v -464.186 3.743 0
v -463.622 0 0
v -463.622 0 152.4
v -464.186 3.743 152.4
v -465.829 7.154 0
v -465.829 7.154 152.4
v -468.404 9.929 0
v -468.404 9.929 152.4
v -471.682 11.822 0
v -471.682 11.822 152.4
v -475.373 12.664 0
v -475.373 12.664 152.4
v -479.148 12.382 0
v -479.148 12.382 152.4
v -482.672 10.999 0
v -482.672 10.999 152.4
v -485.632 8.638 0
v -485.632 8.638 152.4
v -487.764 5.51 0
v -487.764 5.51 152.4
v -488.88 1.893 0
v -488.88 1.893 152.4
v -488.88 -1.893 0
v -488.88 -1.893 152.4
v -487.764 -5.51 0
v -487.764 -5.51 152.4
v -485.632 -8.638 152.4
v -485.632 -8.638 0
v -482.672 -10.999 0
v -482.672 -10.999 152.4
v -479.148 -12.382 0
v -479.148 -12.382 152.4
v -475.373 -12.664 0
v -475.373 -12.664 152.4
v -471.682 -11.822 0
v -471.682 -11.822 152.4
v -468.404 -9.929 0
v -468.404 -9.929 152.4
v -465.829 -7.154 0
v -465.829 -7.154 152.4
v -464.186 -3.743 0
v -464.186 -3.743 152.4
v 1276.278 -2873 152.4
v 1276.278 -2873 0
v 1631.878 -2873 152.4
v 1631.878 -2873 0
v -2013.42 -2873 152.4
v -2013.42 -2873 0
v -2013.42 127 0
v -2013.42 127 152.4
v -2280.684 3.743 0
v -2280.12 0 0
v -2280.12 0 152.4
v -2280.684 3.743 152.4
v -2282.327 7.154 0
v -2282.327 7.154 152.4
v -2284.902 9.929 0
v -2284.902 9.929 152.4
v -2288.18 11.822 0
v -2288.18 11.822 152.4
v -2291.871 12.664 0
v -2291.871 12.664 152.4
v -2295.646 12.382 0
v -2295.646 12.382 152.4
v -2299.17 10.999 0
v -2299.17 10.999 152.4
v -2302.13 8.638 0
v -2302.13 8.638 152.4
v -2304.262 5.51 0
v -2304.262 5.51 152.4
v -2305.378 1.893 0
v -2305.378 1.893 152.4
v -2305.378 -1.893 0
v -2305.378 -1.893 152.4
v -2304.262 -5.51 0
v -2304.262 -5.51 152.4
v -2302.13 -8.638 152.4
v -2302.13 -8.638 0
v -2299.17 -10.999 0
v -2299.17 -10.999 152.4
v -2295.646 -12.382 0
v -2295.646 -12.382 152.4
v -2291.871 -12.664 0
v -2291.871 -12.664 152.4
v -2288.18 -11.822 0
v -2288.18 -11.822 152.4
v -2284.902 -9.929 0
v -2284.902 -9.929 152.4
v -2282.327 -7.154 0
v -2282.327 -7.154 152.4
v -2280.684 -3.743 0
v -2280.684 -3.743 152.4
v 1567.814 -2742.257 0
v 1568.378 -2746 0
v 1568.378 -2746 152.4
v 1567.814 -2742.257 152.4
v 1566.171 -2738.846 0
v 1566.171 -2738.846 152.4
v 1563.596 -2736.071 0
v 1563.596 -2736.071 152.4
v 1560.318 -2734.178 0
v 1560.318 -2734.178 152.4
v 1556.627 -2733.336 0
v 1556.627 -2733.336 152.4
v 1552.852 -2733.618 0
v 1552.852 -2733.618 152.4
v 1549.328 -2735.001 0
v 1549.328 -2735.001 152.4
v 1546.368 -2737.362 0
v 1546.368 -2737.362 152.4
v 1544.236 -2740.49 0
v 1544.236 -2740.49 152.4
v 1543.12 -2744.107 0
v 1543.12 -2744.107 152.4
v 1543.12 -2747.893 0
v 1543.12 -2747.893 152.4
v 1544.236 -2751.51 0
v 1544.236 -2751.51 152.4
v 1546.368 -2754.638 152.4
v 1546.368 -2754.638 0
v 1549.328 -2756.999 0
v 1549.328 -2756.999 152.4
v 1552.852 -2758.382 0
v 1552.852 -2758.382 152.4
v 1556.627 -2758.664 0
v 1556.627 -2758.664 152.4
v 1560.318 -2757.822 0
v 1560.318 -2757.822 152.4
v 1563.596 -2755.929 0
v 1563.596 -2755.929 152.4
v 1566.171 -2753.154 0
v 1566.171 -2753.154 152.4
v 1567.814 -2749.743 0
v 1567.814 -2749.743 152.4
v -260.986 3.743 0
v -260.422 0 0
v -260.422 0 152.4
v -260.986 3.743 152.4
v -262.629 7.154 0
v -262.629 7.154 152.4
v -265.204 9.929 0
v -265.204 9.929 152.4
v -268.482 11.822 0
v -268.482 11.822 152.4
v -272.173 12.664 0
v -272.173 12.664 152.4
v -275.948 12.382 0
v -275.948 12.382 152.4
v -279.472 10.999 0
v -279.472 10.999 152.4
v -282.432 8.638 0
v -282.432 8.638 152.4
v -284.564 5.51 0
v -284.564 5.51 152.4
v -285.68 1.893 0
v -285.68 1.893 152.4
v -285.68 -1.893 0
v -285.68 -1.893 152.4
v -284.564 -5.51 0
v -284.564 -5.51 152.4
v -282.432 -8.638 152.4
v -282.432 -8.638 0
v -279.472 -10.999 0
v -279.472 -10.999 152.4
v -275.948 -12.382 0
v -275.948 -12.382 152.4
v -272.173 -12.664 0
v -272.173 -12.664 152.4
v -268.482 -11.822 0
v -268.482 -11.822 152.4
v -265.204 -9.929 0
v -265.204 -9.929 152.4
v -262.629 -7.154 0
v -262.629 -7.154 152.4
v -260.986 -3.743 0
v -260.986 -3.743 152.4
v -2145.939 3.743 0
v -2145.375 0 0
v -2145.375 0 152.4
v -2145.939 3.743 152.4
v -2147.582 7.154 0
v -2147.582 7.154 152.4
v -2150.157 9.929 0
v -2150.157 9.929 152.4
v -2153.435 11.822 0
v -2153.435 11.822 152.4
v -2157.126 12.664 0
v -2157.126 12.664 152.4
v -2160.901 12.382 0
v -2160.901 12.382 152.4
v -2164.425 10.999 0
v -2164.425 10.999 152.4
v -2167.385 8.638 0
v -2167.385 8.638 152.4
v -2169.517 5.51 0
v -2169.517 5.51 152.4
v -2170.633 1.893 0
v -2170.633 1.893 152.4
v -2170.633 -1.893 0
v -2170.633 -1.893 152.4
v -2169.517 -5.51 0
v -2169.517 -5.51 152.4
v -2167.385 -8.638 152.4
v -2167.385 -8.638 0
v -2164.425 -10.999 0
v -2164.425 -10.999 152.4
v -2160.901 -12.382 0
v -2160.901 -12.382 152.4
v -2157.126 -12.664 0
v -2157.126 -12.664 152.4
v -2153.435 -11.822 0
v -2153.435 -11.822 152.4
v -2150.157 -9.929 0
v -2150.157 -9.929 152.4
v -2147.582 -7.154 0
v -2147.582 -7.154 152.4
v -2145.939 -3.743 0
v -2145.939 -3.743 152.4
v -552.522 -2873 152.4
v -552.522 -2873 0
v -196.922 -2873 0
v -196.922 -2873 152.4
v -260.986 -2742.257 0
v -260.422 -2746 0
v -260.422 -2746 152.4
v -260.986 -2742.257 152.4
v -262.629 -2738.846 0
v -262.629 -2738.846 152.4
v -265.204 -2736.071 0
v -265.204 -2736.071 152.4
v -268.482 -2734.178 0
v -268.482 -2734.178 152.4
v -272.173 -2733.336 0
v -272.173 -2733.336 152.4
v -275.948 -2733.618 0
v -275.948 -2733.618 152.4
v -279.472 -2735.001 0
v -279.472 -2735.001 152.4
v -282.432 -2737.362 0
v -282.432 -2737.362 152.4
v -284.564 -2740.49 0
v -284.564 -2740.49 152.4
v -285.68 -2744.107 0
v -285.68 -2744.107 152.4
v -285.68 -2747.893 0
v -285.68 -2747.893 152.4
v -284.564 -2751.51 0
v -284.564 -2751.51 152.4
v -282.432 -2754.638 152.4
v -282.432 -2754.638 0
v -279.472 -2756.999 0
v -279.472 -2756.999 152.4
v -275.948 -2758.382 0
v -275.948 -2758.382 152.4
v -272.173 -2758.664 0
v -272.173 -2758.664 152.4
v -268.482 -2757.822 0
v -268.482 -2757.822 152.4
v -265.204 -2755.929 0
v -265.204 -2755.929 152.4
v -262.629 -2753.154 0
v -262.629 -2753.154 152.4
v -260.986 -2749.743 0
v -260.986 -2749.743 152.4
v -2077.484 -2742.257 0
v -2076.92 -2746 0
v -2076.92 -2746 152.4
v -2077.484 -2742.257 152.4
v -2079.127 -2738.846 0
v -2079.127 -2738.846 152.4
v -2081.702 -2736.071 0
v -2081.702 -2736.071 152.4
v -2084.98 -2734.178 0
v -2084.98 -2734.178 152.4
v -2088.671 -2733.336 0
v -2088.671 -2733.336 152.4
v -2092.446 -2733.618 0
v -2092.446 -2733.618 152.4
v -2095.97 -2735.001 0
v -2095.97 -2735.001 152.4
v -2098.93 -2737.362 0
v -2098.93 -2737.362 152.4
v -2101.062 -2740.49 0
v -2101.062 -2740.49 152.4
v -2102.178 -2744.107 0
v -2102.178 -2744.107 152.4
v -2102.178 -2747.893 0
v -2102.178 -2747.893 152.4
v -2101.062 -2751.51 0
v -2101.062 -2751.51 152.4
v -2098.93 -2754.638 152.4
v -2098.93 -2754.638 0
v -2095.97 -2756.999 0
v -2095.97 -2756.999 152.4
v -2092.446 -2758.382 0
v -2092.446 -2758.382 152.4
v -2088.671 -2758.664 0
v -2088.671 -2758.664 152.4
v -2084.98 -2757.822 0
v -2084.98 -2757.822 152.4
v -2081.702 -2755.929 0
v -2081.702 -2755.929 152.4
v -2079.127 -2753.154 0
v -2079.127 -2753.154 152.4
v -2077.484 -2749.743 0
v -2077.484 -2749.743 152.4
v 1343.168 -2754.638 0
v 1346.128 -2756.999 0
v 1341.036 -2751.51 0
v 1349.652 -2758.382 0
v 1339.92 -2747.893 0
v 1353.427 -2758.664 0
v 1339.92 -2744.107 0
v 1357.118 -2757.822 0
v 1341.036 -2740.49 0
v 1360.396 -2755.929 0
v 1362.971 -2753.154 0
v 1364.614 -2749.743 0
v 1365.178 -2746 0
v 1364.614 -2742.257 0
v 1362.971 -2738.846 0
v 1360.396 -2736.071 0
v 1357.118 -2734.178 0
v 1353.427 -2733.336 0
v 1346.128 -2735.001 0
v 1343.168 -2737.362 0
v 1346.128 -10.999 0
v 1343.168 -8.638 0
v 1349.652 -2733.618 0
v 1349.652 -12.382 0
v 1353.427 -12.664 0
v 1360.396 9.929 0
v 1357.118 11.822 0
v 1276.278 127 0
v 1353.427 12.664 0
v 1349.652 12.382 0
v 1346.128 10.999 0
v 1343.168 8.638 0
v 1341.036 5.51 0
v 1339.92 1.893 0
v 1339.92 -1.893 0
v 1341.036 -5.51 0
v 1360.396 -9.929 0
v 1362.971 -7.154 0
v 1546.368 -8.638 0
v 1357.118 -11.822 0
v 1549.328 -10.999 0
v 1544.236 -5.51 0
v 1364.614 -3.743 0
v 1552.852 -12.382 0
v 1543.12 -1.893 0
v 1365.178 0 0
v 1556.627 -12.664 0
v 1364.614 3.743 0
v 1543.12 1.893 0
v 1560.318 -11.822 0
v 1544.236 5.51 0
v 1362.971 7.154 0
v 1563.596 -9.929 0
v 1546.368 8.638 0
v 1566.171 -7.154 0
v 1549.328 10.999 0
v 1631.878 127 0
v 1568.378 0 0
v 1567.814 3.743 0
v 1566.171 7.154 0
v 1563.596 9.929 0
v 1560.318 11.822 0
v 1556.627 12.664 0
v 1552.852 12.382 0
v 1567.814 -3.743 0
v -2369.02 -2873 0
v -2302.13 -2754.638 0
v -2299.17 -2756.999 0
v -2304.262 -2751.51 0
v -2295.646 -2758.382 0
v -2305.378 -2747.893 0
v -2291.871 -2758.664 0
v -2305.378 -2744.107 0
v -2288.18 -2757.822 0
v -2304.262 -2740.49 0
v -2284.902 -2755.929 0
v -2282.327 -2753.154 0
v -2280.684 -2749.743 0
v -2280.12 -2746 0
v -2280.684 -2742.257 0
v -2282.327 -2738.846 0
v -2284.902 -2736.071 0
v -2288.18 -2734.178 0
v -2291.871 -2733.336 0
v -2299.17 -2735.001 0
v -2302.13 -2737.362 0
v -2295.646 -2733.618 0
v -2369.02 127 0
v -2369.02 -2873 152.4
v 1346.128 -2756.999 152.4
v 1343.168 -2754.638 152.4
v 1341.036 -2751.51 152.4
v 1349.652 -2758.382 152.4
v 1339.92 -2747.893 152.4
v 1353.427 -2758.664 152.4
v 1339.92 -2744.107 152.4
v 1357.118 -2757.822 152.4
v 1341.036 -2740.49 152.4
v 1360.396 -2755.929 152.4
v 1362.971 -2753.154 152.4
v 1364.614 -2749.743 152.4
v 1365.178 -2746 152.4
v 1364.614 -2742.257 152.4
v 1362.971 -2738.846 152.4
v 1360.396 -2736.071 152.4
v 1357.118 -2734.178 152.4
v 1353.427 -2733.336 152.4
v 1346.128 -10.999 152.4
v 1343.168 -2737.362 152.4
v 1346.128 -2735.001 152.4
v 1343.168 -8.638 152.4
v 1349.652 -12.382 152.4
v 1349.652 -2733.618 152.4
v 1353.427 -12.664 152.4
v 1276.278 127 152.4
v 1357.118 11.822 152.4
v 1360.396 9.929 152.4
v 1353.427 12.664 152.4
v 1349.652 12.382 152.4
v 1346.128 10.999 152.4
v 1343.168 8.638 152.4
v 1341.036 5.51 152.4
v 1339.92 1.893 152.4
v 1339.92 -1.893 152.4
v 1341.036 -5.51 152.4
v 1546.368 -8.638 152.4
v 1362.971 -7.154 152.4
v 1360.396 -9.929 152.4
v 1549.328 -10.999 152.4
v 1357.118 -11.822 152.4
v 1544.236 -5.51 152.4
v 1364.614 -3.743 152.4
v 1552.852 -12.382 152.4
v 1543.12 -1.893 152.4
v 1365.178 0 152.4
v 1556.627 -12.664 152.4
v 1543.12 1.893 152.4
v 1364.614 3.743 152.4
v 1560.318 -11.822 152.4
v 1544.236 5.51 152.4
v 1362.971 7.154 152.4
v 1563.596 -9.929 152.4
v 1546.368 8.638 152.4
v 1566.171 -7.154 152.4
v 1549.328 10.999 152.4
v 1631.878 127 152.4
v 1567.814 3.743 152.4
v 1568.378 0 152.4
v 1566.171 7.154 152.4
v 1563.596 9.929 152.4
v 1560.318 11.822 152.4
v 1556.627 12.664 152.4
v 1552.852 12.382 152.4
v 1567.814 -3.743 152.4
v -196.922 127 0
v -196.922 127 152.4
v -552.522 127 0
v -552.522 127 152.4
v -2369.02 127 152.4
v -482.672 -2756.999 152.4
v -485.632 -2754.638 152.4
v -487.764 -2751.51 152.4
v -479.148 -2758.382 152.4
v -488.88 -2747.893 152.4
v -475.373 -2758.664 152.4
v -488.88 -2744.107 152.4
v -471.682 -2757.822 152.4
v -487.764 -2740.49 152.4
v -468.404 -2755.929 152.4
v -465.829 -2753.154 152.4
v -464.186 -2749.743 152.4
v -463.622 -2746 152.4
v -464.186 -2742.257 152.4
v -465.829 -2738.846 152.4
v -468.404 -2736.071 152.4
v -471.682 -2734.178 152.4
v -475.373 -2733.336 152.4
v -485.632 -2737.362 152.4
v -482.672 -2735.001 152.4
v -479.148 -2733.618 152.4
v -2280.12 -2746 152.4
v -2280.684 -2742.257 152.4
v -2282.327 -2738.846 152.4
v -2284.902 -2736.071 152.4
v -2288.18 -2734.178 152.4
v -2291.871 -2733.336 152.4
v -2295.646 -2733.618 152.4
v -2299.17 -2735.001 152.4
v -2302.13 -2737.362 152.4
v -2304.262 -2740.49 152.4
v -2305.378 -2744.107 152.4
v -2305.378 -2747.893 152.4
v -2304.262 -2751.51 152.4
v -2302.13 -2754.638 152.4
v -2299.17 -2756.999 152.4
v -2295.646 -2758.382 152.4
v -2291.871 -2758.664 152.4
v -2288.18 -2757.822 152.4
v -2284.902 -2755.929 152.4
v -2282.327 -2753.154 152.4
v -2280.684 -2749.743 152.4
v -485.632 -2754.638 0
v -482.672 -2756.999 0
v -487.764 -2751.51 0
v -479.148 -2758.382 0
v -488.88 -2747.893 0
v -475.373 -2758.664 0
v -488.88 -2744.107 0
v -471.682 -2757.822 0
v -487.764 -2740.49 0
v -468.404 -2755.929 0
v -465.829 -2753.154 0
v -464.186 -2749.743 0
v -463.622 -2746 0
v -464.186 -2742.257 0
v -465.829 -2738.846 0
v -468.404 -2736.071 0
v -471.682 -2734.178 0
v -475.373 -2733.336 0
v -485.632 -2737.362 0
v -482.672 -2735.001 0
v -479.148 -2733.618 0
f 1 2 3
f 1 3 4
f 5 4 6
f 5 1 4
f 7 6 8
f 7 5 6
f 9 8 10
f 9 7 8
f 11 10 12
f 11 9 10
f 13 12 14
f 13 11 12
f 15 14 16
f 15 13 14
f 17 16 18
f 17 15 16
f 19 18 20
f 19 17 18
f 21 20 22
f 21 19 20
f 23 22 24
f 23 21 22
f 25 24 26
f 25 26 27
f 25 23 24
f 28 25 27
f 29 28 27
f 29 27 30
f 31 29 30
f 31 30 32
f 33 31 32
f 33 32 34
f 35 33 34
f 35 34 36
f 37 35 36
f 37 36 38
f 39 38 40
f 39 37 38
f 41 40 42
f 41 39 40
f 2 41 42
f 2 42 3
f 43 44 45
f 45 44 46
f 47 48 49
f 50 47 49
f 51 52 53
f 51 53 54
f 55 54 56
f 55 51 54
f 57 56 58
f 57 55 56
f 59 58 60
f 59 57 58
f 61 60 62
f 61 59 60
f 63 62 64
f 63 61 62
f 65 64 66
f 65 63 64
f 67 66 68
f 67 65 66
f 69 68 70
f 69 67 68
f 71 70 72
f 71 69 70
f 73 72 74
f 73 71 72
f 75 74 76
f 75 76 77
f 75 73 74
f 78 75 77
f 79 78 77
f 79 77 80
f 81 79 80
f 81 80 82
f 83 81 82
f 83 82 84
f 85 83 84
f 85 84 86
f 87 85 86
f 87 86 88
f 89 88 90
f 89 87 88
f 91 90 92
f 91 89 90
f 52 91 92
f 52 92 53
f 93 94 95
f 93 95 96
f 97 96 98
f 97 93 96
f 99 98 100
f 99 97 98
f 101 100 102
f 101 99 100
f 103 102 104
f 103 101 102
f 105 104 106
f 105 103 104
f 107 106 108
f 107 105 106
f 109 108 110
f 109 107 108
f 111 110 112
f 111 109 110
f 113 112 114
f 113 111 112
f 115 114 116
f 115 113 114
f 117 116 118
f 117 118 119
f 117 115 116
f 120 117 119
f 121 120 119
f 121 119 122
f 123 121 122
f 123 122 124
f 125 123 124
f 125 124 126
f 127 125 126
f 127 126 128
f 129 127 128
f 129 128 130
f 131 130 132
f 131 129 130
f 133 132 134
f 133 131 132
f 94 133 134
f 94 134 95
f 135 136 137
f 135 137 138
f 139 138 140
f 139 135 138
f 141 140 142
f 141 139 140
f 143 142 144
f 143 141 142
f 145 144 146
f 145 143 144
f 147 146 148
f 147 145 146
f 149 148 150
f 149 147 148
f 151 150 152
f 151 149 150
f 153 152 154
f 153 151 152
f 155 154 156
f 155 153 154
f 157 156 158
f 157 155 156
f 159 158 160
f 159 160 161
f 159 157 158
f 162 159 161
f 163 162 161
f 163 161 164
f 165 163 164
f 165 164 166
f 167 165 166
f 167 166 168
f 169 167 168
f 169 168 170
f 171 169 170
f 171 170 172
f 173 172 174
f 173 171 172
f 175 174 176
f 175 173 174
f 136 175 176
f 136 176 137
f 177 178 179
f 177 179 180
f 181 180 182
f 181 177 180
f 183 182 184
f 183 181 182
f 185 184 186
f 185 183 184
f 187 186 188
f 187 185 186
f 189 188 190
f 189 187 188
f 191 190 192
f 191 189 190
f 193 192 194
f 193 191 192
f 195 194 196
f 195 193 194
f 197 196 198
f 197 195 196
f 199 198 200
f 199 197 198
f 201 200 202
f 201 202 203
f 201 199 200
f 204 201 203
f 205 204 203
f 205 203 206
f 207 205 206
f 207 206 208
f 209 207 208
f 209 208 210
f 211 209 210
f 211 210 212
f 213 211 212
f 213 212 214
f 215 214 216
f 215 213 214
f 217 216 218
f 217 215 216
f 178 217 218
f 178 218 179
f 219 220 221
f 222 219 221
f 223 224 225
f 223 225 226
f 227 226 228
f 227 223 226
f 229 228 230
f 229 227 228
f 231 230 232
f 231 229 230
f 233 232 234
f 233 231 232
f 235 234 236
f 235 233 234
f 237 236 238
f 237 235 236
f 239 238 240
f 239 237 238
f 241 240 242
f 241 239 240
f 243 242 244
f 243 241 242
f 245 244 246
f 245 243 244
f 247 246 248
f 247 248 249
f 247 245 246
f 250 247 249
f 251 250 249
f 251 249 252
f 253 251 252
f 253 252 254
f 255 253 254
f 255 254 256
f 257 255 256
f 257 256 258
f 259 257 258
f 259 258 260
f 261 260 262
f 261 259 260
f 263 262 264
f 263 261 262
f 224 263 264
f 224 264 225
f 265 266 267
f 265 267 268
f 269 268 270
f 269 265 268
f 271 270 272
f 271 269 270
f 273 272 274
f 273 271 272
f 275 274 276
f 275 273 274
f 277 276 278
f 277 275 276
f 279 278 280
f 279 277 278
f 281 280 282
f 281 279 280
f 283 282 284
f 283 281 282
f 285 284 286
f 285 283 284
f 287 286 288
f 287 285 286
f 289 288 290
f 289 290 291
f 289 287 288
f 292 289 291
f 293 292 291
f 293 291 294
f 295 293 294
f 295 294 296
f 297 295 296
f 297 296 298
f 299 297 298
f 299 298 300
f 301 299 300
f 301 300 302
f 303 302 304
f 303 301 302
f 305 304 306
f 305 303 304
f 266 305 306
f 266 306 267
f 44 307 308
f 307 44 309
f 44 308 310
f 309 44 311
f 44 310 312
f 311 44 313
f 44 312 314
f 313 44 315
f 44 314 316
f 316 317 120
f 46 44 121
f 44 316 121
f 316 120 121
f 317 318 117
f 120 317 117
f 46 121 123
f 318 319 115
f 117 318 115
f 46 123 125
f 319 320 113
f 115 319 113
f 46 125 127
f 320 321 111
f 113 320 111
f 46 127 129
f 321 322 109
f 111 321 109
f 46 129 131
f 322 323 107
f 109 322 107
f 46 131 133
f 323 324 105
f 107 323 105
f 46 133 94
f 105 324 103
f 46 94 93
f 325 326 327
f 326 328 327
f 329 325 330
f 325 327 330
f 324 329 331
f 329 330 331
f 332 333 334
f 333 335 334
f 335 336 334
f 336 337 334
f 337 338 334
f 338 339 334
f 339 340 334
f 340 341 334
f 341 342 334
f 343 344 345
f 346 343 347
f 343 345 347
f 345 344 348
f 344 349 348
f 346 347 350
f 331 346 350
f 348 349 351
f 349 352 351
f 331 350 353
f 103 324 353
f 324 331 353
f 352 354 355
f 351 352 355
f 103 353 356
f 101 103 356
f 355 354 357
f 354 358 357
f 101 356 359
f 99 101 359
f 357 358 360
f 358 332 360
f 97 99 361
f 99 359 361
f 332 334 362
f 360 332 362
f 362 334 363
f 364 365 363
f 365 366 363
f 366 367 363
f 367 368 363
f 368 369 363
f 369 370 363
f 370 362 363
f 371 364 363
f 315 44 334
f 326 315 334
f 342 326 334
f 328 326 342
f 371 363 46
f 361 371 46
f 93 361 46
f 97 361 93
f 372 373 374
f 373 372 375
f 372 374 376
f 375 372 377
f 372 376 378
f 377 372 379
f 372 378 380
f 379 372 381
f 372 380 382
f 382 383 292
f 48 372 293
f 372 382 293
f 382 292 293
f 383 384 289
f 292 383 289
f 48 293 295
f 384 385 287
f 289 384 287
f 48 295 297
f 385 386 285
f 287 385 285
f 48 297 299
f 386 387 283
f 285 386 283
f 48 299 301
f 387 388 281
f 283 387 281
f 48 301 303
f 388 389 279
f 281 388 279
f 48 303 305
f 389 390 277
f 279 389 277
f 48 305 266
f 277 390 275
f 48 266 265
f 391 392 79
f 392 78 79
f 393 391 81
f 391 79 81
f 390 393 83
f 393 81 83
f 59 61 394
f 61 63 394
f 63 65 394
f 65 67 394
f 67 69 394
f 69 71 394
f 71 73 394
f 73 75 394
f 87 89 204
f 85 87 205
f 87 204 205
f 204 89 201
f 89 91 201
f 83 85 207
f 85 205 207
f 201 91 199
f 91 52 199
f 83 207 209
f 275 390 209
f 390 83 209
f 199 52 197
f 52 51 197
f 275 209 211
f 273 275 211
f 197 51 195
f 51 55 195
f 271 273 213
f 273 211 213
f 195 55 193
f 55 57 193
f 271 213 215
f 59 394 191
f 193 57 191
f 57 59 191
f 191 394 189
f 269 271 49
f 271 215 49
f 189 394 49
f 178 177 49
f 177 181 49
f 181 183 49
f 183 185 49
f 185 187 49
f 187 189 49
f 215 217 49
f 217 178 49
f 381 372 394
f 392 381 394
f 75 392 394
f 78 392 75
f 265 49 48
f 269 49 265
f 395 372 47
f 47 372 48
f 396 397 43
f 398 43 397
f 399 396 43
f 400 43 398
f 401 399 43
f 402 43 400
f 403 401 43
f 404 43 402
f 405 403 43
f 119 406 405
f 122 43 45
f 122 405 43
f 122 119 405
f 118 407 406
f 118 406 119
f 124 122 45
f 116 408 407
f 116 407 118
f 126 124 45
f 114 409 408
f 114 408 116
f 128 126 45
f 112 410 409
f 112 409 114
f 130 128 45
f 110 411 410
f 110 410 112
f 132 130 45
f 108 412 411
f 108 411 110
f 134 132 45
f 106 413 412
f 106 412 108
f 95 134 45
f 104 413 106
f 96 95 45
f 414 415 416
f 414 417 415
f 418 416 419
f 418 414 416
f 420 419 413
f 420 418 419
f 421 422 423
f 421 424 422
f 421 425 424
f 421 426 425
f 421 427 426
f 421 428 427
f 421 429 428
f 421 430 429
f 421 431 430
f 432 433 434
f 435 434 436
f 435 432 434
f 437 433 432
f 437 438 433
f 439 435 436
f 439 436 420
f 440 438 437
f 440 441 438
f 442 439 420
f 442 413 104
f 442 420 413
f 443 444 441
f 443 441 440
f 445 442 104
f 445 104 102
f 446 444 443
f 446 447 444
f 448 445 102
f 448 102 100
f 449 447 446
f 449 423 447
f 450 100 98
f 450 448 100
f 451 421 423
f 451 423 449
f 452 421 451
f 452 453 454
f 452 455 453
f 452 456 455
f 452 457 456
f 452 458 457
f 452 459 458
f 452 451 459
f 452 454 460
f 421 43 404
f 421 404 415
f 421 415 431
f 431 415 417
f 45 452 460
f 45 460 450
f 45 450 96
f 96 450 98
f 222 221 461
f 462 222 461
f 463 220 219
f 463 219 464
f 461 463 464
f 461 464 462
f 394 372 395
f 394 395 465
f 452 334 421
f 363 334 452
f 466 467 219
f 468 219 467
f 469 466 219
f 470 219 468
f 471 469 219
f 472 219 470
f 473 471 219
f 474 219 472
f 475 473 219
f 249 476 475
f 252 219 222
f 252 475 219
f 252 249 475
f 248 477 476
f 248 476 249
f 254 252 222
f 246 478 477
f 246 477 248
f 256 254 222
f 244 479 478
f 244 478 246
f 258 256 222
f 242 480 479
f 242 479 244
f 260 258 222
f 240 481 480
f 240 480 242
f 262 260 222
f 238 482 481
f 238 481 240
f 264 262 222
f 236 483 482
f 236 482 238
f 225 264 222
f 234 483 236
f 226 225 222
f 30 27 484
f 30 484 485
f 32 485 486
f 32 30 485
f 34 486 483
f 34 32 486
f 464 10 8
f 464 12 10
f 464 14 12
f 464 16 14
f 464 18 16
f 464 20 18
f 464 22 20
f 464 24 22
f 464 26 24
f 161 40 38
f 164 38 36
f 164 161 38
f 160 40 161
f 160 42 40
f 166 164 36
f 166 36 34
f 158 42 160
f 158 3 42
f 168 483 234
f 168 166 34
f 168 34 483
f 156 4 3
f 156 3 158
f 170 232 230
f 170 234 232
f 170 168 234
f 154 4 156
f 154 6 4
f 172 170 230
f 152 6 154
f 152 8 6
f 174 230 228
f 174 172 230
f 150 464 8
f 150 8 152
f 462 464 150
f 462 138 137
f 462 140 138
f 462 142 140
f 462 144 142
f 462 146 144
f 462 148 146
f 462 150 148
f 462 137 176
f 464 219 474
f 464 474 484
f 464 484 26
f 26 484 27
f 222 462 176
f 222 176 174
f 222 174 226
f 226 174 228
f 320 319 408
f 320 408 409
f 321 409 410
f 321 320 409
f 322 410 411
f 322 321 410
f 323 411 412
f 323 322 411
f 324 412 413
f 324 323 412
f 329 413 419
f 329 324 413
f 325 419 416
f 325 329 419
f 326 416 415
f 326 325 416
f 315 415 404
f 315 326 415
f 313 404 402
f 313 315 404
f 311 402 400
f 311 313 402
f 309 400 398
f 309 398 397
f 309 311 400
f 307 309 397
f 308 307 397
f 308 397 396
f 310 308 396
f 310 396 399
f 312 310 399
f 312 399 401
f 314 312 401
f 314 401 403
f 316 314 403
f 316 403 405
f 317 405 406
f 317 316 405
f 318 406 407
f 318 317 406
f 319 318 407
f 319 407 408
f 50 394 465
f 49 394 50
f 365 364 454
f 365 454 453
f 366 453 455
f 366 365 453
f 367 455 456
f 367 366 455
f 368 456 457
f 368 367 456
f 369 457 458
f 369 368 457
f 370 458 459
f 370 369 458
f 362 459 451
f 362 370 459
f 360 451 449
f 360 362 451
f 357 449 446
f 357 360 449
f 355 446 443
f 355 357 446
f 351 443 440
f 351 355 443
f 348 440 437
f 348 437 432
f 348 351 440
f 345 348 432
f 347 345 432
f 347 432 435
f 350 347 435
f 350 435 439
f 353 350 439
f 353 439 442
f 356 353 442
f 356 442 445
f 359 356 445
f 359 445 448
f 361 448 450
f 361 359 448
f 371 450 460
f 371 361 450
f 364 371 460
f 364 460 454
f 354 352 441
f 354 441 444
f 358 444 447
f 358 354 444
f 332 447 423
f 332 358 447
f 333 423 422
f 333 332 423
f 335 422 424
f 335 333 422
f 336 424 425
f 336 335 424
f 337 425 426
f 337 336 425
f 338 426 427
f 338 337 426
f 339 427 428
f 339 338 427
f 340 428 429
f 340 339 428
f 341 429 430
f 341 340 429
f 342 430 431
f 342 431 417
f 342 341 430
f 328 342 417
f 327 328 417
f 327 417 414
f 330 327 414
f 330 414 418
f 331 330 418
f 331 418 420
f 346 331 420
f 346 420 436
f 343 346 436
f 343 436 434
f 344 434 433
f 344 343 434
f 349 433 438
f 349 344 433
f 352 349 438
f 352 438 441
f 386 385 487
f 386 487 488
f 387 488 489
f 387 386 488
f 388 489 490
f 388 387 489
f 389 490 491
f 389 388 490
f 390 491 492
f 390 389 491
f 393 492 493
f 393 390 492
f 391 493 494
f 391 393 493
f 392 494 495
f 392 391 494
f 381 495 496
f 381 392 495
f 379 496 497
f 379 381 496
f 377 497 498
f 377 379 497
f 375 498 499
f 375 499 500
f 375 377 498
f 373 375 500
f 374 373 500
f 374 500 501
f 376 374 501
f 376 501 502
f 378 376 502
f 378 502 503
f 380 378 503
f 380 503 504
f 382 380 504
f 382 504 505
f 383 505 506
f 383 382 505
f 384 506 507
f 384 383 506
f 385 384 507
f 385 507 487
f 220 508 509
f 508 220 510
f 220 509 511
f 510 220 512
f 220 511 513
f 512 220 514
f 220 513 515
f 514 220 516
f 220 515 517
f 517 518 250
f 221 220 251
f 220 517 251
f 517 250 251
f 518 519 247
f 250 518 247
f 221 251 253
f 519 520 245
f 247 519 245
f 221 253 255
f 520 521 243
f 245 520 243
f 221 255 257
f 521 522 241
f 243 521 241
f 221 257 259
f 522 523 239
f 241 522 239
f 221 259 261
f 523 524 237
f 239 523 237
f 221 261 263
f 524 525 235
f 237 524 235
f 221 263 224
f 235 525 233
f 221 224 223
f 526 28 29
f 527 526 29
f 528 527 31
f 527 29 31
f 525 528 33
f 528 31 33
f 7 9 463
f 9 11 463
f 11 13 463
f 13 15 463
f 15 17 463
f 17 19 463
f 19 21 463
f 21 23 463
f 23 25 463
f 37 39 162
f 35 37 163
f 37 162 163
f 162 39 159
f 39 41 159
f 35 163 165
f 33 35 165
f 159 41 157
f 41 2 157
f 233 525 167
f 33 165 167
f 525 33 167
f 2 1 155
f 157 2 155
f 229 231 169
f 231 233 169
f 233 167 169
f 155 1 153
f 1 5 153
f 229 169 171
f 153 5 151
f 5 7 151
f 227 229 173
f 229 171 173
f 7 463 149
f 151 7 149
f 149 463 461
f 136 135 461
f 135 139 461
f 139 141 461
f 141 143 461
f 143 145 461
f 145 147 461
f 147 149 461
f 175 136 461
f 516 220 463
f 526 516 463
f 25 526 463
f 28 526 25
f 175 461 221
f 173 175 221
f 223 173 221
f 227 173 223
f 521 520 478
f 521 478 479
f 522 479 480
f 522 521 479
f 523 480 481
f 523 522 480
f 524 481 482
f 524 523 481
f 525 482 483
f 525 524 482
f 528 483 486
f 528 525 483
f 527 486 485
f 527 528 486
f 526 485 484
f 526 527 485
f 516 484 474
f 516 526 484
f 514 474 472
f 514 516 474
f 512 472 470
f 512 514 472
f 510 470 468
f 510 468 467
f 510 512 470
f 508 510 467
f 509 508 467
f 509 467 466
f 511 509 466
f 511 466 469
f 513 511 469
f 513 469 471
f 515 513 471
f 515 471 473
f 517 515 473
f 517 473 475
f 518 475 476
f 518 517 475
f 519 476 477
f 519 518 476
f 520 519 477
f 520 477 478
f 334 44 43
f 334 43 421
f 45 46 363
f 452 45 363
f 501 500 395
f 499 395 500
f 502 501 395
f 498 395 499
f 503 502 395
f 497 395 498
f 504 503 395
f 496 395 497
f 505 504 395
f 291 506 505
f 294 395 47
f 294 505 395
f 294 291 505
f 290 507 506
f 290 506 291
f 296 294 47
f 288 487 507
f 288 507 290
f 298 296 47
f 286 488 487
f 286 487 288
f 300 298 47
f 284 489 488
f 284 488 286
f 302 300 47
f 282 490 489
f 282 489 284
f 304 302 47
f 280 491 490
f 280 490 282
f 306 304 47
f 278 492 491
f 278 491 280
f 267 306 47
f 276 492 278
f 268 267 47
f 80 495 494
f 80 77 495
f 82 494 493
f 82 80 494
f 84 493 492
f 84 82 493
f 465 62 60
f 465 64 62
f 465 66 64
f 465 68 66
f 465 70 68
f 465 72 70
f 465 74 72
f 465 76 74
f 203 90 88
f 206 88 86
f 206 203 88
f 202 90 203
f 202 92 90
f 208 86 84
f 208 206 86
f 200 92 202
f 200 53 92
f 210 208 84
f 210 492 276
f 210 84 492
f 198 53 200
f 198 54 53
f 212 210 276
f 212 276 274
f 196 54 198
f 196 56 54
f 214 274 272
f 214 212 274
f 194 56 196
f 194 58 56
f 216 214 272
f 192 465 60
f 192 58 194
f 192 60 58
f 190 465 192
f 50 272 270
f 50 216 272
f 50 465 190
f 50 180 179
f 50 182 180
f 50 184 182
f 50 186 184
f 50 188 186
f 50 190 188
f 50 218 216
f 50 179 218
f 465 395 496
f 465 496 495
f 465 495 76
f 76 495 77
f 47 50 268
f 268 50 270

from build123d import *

# Parameters (mm, degrees)
F0_W     = 355.6
F0_H     = 3000
F0_R     = 12.7
F1_DEPTH = 152.4


with BuildPart() as f1:
    # F0 (on Top) → F1 (new body)
    with BuildSketch(Plane.XY):
        with Locations((-2191.219977, -1373)):
            Rectangle(F0_W, F0_H)
        with Locations((-2292.819977, -2746)):
            Circle(F0_R, mode=Mode.SUBTRACT)
        with Locations((-2089.619977, -2746)):
            Circle(F0_R, mode=Mode.SUBTRACT)
        with Locations((-2292.819977, 0)):
            Circle(F0_R, mode=Mode.SUBTRACT)
        with Locations((-2158.075094, 0)):
            Circle(F0_R, mode=Mode.SUBTRACT)
        with Locations((-374.722089, -1373)):
            Rectangle(F0_W, F0_H)
        with Locations((-476.322089, -2746)):
            Circle(F0_R, mode=Mode.SUBTRACT)
        with Locations((-273.122089, -2746)):
            Circle(F0_R, mode=Mode.SUBTRACT)
        with Locations((-476.322089, 0)):
            Circle(F0_R, mode=Mode.SUBTRACT)
        with Locations((-273.122089, 0)):
            Circle(F0_R, mode=Mode.SUBTRACT)
        with Locations((1454.078107, -1373)):
            Rectangle(F0_W, F0_H)
        with Locations((1352.478107, -2746)):
            Circle(F0_R, mode=Mode.SUBTRACT)
        with Locations((1555.678107, -2746)):
            Circle(F0_R, mode=Mode.SUBTRACT)
        with Locations((1352.478107, 0)):
            Circle(F0_R, mode=Mode.SUBTRACT)
        with Locations((1555.678107, 0)):
            Circle(F0_R, mode=Mode.SUBTRACT)
    extrude(amount=F1_DEPTH)


solid = f1.part
